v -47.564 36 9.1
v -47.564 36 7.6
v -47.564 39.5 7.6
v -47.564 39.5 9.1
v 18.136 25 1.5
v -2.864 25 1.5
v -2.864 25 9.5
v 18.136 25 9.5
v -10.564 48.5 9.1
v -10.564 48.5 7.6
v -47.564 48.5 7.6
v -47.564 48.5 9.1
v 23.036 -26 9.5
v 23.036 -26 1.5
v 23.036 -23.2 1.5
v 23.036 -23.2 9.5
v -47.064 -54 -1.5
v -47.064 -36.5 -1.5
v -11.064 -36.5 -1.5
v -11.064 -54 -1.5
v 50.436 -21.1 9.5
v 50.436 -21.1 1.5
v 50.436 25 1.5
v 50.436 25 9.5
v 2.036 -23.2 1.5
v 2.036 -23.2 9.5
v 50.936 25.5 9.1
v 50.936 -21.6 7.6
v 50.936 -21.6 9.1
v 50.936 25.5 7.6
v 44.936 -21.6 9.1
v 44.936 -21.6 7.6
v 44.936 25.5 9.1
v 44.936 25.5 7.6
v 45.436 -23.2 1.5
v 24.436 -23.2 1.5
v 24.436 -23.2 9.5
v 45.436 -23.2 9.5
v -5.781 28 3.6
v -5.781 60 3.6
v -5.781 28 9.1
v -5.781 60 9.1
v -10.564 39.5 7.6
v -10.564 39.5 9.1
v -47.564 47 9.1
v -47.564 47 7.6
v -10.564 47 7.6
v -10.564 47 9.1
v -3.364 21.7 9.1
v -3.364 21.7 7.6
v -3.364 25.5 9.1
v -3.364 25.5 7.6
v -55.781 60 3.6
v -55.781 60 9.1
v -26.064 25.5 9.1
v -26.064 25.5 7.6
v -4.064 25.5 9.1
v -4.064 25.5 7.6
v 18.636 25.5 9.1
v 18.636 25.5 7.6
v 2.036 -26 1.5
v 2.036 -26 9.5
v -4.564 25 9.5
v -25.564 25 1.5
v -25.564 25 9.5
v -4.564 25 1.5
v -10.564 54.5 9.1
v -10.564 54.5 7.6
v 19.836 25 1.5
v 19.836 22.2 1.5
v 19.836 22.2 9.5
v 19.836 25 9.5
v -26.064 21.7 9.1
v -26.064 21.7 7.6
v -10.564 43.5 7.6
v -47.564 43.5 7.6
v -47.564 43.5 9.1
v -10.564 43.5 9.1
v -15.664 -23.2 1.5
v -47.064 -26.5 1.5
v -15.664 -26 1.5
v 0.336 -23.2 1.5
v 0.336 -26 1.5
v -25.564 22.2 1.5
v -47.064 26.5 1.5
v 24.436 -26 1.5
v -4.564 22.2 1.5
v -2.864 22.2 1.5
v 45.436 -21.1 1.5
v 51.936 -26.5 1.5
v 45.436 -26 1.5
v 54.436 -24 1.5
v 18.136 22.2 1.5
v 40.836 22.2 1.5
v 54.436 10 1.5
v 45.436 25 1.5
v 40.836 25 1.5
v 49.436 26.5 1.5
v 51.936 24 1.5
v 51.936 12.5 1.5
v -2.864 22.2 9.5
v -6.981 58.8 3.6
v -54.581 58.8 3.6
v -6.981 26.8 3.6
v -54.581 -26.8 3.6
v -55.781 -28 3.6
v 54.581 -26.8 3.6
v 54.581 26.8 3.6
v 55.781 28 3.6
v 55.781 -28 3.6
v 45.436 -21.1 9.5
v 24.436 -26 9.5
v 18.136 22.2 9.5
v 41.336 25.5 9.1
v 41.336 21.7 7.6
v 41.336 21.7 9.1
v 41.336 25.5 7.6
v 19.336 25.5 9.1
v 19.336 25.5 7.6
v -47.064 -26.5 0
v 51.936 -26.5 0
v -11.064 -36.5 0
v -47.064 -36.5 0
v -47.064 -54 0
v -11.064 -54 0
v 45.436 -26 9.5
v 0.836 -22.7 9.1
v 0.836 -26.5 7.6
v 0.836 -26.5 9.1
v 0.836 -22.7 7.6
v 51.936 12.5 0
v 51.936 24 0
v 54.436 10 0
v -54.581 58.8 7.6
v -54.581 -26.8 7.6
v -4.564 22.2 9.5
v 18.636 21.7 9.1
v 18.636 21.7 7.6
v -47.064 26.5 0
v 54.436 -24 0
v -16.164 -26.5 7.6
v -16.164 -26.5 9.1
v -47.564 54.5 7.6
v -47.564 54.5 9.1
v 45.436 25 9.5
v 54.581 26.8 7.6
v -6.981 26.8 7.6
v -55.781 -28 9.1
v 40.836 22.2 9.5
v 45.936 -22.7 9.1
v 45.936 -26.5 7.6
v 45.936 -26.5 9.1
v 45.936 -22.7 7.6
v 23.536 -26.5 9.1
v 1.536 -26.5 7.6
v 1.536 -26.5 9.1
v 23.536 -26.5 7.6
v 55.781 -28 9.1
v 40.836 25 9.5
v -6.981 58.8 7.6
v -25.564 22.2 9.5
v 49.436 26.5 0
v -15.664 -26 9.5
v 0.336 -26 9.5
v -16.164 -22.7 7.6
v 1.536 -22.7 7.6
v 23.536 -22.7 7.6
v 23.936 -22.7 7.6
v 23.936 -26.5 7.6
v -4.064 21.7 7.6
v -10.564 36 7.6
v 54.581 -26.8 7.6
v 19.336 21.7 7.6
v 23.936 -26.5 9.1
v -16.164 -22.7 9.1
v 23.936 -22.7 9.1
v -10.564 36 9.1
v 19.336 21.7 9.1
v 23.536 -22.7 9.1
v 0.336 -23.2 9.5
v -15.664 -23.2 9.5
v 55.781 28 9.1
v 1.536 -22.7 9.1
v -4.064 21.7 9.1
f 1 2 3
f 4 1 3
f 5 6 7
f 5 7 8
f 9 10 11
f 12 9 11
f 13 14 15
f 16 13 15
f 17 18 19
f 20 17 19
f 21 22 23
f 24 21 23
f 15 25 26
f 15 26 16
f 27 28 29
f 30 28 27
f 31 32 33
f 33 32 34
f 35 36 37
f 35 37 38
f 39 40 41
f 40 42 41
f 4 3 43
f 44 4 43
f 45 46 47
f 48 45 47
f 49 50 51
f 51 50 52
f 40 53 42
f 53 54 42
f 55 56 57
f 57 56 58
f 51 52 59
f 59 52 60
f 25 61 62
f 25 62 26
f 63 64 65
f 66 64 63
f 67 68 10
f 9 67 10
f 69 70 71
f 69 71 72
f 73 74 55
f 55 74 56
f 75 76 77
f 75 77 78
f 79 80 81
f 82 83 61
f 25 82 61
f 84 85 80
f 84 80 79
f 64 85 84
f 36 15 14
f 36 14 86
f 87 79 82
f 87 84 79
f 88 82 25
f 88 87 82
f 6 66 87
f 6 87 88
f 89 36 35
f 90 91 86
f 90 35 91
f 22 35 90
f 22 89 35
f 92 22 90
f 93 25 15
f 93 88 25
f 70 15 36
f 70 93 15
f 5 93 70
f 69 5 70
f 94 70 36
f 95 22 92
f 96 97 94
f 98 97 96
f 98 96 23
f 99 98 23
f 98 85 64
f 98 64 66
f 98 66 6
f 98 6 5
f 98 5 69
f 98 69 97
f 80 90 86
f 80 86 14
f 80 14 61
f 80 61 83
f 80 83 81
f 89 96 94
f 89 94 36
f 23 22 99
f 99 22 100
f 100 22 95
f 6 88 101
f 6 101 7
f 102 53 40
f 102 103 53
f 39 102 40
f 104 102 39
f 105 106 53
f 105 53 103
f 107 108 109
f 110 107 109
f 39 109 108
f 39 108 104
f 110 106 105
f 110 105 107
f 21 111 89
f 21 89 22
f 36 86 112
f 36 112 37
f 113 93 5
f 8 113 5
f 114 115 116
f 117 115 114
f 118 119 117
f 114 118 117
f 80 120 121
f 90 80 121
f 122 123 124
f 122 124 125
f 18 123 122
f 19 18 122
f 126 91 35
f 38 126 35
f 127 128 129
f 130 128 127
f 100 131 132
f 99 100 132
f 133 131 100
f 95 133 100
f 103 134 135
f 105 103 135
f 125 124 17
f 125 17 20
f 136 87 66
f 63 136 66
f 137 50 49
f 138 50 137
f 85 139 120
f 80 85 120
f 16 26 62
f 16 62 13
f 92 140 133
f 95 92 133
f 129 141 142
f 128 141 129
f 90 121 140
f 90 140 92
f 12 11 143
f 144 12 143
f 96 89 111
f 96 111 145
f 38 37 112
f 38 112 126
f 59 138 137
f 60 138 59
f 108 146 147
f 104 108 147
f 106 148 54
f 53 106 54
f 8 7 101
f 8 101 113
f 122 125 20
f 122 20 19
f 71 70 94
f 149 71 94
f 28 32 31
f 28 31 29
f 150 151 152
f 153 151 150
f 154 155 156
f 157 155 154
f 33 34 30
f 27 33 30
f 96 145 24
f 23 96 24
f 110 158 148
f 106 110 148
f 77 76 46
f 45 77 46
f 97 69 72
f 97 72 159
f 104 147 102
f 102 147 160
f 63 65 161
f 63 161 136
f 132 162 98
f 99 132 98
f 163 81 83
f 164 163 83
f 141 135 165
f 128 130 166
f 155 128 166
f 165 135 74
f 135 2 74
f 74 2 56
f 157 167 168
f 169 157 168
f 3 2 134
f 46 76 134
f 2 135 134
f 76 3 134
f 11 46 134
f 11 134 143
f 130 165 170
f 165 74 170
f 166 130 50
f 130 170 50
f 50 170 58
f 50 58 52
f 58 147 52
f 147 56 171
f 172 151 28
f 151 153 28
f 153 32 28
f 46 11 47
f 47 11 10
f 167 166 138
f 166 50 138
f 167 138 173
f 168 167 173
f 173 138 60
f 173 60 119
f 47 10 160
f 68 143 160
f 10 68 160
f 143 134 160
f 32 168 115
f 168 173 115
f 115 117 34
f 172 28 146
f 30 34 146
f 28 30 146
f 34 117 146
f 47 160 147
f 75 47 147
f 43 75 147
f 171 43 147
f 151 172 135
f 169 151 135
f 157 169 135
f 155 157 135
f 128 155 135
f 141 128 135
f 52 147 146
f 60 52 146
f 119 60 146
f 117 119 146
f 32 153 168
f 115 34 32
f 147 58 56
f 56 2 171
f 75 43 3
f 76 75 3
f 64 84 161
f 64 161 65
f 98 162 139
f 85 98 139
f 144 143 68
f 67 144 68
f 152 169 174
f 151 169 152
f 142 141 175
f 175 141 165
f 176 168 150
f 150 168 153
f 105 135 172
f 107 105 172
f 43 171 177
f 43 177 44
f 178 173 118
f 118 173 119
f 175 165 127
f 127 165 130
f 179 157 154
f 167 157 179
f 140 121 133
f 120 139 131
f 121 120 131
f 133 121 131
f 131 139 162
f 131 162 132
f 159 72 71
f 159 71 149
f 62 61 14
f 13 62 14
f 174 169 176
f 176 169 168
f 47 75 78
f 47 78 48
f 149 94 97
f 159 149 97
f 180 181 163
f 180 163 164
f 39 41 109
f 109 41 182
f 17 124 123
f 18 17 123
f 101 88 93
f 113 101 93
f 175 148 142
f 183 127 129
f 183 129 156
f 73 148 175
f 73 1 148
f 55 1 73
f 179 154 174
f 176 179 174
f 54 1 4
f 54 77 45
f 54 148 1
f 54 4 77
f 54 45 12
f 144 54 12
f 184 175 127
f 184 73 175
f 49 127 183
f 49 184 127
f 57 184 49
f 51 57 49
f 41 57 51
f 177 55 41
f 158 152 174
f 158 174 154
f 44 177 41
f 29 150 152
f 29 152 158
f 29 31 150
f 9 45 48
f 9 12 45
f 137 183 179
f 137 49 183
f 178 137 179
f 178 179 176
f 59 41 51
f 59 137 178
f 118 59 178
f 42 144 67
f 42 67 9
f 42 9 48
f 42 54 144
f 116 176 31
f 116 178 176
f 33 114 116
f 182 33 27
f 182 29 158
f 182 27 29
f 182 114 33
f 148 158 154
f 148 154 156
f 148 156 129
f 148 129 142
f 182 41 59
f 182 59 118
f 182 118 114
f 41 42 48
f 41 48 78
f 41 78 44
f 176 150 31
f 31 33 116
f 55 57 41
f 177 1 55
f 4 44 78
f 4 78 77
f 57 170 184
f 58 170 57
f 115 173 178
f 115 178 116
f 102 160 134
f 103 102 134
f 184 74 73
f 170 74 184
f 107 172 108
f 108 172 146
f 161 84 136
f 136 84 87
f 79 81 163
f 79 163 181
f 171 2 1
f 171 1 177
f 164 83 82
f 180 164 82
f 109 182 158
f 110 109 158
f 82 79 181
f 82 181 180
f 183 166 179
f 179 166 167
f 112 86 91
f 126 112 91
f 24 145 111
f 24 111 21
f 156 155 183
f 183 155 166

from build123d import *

# Parameters (mm, degrees)
F1_DEPTH  = 1.5
F2_SIZE   = 2.49999
F3_W      = 21
F3_H      = 2.8
F3_W_2    = 5
F3_H_2    = 46.1
F3_W_3    = 16
F4_DEPTH  = 8
F5_W      = 36
F5_H      = 17.5
F6_DEPTH  = 1.5
F9_W      = 17
F9_H      = 3.8
F9_W_2    = 22
F9_W_3    = 37
F9_H_2    = 3.5
F9_W_4    = 6
F9_H_3    = 47.1
F10_DEPTH = 1.5
F12_DEPTH = 4


# Not quite as in the source:
# - a fillet or chamfer is up to 0.001 mm smaller than in the source, because OpenCascade refuses the exact size
# - a feature names something its author has since deleted; it is built from what else it names


with BuildPart() as f1:
    # F0 (on Top) → F1 (new body)
    with BuildSketch(Plane.XY):
        Polygon((51.935759174, 26.5), (-47.064240826, 26.5), (-47.064240826, -26.5), (54.435759174, -26.5), (54.435759174, 12.5), (51.935759174, 12.5), align=None)
    extrude(amount=F1_DEPTH)

    # F2 (size 2.5 in the source; OpenCascade refuses exactly that, so slightly less here)
    f2_edges = [f1.edges().sort_by_distance(p)[0] for p in [
        (54.435759, 12.5, 0.75),
        (51.935759, 26.5, 0.75),
        (54.435759, -26.5, 0.75),
    ]]
    chamfer(f2_edges, length=F2_SIZE)

    # F3 (on face) → F4 (join)
    with BuildSketch(Plane.XY.offset(1.5)):
        with Locations((-15.064240826, 23.6)):
            Rectangle(F3_W, F3_H)
        with Locations((7.635759174, 23.6)):
            Rectangle(F3_W, F3_H)
        with Locations((30.335759174, 23.6)):
            Rectangle(F3_W, F3_H)
        with Locations((47.935759174, 1.95)):
            Rectangle(F3_W_2, F3_H_2)
        with Locations((34.935759174, -24.6)):
            Rectangle(F3_W, F3_H)
        with Locations((12.535759174, -24.6)):
            Rectangle(F3_W, F3_H)
        with Locations((-7.664240826, -24.6)):
            Rectangle(F3_W_3, F3_H)
    extrude(amount=F4_DEPTH)


with BuildPart() as f6:
    # F5 (on Top) → F6 (new body)
    with BuildSketch(Plane.XY):
        with Locations((-29.064240826, -45.25)):
            Rectangle(F5_W, F5_H)
    extrude(amount=-F6_DEPTH)


with BuildPart() as f10:
    # F9 (on offset) → F10 (new body)
    with BuildSketch(Plane.XY.offset(7.6)):
        Polygon((-55.7806417346, 28), (-55.7806417346, -28), (-5.7806417346, -28), (55.7806417346, -28), (55.7806417346, 28), (-5.7806417346, 28), (-5.7806417346, 60), (-55.7806417346, 60), align=None)
        with Locations((-7.664240826, -24.6)):
            Rectangle(F9_W, F9_H, mode=Mode.SUBTRACT)
        with Locations((12.535759174, -24.6)):
            Rectangle(F9_W_2, F9_H, mode=Mode.SUBTRACT)
        with Locations((34.935759174, -24.6)):
            Rectangle(F9_W_2, F9_H, mode=Mode.SUBTRACT)
        with Locations((-15.064240826, 23.6)):
            Rectangle(F9_W_2, F9_H, mode=Mode.SUBTRACT)
        with Locations((-29.064240826, 37.75)):
            Rectangle(F9_W_3, F9_H_2, mode=Mode.SUBTRACT)
        with Locations((-29.064240826, 45.25)):
            Rectangle(F9_W_3, F9_H_2, mode=Mode.SUBTRACT)
        Polygon((-47.564240826, 48.5), (-47.564240826, 51.5), (-47.564240826, 54.5), (-10.564240826, 54.5), (-10.564240826, 51.5), (-10.564240826, 48.5), align=None, mode=Mode.SUBTRACT)
        with Locations((7.635759174, 23.6)):
            Rectangle(F9_W_2, F9_H, mode=Mode.SUBTRACT)
        with Locations((47.935759174, 1.95)):
            Rectangle(F9_W_4, F9_H_3, mode=Mode.SUBTRACT)
        with Locations((30.335759174, 23.6)):
            Rectangle(F9_W_2, F9_H, mode=Mode.SUBTRACT)
    extrude(amount=F10_DEPTH)

    # F11 (on face) → F12 (join)
    with BuildSketch(Plane(origin=(0, 0, 7.6), x_dir=(1, 0, 0), z_dir=(0, 0, -1))):
        Polygon((-55.7806417346, 28), (-55.7806417346, -28), (-55.7806417346, -60), (-5.7806417346, -60), (-5.7806417346, -28), (55.7806417346, -28), (55.7806417346, 28), (-5.7806417346, 28), align=None)
        Polygon((-54.5806417346, -58.8), (-54.5806417346, -30), (-54.5806417346, 26.8), (-6, 26.8), (54.5806417346, 26.8), (54.5806417346, -26.8), (-6.9806417346, -26.8), (-6.9806417346, -58.8), align=None, mode=Mode.SUBTRACT)
    extrude(amount=F12_DEPTH)


solid = Compound([f1.part, f6.part, f10.part])
